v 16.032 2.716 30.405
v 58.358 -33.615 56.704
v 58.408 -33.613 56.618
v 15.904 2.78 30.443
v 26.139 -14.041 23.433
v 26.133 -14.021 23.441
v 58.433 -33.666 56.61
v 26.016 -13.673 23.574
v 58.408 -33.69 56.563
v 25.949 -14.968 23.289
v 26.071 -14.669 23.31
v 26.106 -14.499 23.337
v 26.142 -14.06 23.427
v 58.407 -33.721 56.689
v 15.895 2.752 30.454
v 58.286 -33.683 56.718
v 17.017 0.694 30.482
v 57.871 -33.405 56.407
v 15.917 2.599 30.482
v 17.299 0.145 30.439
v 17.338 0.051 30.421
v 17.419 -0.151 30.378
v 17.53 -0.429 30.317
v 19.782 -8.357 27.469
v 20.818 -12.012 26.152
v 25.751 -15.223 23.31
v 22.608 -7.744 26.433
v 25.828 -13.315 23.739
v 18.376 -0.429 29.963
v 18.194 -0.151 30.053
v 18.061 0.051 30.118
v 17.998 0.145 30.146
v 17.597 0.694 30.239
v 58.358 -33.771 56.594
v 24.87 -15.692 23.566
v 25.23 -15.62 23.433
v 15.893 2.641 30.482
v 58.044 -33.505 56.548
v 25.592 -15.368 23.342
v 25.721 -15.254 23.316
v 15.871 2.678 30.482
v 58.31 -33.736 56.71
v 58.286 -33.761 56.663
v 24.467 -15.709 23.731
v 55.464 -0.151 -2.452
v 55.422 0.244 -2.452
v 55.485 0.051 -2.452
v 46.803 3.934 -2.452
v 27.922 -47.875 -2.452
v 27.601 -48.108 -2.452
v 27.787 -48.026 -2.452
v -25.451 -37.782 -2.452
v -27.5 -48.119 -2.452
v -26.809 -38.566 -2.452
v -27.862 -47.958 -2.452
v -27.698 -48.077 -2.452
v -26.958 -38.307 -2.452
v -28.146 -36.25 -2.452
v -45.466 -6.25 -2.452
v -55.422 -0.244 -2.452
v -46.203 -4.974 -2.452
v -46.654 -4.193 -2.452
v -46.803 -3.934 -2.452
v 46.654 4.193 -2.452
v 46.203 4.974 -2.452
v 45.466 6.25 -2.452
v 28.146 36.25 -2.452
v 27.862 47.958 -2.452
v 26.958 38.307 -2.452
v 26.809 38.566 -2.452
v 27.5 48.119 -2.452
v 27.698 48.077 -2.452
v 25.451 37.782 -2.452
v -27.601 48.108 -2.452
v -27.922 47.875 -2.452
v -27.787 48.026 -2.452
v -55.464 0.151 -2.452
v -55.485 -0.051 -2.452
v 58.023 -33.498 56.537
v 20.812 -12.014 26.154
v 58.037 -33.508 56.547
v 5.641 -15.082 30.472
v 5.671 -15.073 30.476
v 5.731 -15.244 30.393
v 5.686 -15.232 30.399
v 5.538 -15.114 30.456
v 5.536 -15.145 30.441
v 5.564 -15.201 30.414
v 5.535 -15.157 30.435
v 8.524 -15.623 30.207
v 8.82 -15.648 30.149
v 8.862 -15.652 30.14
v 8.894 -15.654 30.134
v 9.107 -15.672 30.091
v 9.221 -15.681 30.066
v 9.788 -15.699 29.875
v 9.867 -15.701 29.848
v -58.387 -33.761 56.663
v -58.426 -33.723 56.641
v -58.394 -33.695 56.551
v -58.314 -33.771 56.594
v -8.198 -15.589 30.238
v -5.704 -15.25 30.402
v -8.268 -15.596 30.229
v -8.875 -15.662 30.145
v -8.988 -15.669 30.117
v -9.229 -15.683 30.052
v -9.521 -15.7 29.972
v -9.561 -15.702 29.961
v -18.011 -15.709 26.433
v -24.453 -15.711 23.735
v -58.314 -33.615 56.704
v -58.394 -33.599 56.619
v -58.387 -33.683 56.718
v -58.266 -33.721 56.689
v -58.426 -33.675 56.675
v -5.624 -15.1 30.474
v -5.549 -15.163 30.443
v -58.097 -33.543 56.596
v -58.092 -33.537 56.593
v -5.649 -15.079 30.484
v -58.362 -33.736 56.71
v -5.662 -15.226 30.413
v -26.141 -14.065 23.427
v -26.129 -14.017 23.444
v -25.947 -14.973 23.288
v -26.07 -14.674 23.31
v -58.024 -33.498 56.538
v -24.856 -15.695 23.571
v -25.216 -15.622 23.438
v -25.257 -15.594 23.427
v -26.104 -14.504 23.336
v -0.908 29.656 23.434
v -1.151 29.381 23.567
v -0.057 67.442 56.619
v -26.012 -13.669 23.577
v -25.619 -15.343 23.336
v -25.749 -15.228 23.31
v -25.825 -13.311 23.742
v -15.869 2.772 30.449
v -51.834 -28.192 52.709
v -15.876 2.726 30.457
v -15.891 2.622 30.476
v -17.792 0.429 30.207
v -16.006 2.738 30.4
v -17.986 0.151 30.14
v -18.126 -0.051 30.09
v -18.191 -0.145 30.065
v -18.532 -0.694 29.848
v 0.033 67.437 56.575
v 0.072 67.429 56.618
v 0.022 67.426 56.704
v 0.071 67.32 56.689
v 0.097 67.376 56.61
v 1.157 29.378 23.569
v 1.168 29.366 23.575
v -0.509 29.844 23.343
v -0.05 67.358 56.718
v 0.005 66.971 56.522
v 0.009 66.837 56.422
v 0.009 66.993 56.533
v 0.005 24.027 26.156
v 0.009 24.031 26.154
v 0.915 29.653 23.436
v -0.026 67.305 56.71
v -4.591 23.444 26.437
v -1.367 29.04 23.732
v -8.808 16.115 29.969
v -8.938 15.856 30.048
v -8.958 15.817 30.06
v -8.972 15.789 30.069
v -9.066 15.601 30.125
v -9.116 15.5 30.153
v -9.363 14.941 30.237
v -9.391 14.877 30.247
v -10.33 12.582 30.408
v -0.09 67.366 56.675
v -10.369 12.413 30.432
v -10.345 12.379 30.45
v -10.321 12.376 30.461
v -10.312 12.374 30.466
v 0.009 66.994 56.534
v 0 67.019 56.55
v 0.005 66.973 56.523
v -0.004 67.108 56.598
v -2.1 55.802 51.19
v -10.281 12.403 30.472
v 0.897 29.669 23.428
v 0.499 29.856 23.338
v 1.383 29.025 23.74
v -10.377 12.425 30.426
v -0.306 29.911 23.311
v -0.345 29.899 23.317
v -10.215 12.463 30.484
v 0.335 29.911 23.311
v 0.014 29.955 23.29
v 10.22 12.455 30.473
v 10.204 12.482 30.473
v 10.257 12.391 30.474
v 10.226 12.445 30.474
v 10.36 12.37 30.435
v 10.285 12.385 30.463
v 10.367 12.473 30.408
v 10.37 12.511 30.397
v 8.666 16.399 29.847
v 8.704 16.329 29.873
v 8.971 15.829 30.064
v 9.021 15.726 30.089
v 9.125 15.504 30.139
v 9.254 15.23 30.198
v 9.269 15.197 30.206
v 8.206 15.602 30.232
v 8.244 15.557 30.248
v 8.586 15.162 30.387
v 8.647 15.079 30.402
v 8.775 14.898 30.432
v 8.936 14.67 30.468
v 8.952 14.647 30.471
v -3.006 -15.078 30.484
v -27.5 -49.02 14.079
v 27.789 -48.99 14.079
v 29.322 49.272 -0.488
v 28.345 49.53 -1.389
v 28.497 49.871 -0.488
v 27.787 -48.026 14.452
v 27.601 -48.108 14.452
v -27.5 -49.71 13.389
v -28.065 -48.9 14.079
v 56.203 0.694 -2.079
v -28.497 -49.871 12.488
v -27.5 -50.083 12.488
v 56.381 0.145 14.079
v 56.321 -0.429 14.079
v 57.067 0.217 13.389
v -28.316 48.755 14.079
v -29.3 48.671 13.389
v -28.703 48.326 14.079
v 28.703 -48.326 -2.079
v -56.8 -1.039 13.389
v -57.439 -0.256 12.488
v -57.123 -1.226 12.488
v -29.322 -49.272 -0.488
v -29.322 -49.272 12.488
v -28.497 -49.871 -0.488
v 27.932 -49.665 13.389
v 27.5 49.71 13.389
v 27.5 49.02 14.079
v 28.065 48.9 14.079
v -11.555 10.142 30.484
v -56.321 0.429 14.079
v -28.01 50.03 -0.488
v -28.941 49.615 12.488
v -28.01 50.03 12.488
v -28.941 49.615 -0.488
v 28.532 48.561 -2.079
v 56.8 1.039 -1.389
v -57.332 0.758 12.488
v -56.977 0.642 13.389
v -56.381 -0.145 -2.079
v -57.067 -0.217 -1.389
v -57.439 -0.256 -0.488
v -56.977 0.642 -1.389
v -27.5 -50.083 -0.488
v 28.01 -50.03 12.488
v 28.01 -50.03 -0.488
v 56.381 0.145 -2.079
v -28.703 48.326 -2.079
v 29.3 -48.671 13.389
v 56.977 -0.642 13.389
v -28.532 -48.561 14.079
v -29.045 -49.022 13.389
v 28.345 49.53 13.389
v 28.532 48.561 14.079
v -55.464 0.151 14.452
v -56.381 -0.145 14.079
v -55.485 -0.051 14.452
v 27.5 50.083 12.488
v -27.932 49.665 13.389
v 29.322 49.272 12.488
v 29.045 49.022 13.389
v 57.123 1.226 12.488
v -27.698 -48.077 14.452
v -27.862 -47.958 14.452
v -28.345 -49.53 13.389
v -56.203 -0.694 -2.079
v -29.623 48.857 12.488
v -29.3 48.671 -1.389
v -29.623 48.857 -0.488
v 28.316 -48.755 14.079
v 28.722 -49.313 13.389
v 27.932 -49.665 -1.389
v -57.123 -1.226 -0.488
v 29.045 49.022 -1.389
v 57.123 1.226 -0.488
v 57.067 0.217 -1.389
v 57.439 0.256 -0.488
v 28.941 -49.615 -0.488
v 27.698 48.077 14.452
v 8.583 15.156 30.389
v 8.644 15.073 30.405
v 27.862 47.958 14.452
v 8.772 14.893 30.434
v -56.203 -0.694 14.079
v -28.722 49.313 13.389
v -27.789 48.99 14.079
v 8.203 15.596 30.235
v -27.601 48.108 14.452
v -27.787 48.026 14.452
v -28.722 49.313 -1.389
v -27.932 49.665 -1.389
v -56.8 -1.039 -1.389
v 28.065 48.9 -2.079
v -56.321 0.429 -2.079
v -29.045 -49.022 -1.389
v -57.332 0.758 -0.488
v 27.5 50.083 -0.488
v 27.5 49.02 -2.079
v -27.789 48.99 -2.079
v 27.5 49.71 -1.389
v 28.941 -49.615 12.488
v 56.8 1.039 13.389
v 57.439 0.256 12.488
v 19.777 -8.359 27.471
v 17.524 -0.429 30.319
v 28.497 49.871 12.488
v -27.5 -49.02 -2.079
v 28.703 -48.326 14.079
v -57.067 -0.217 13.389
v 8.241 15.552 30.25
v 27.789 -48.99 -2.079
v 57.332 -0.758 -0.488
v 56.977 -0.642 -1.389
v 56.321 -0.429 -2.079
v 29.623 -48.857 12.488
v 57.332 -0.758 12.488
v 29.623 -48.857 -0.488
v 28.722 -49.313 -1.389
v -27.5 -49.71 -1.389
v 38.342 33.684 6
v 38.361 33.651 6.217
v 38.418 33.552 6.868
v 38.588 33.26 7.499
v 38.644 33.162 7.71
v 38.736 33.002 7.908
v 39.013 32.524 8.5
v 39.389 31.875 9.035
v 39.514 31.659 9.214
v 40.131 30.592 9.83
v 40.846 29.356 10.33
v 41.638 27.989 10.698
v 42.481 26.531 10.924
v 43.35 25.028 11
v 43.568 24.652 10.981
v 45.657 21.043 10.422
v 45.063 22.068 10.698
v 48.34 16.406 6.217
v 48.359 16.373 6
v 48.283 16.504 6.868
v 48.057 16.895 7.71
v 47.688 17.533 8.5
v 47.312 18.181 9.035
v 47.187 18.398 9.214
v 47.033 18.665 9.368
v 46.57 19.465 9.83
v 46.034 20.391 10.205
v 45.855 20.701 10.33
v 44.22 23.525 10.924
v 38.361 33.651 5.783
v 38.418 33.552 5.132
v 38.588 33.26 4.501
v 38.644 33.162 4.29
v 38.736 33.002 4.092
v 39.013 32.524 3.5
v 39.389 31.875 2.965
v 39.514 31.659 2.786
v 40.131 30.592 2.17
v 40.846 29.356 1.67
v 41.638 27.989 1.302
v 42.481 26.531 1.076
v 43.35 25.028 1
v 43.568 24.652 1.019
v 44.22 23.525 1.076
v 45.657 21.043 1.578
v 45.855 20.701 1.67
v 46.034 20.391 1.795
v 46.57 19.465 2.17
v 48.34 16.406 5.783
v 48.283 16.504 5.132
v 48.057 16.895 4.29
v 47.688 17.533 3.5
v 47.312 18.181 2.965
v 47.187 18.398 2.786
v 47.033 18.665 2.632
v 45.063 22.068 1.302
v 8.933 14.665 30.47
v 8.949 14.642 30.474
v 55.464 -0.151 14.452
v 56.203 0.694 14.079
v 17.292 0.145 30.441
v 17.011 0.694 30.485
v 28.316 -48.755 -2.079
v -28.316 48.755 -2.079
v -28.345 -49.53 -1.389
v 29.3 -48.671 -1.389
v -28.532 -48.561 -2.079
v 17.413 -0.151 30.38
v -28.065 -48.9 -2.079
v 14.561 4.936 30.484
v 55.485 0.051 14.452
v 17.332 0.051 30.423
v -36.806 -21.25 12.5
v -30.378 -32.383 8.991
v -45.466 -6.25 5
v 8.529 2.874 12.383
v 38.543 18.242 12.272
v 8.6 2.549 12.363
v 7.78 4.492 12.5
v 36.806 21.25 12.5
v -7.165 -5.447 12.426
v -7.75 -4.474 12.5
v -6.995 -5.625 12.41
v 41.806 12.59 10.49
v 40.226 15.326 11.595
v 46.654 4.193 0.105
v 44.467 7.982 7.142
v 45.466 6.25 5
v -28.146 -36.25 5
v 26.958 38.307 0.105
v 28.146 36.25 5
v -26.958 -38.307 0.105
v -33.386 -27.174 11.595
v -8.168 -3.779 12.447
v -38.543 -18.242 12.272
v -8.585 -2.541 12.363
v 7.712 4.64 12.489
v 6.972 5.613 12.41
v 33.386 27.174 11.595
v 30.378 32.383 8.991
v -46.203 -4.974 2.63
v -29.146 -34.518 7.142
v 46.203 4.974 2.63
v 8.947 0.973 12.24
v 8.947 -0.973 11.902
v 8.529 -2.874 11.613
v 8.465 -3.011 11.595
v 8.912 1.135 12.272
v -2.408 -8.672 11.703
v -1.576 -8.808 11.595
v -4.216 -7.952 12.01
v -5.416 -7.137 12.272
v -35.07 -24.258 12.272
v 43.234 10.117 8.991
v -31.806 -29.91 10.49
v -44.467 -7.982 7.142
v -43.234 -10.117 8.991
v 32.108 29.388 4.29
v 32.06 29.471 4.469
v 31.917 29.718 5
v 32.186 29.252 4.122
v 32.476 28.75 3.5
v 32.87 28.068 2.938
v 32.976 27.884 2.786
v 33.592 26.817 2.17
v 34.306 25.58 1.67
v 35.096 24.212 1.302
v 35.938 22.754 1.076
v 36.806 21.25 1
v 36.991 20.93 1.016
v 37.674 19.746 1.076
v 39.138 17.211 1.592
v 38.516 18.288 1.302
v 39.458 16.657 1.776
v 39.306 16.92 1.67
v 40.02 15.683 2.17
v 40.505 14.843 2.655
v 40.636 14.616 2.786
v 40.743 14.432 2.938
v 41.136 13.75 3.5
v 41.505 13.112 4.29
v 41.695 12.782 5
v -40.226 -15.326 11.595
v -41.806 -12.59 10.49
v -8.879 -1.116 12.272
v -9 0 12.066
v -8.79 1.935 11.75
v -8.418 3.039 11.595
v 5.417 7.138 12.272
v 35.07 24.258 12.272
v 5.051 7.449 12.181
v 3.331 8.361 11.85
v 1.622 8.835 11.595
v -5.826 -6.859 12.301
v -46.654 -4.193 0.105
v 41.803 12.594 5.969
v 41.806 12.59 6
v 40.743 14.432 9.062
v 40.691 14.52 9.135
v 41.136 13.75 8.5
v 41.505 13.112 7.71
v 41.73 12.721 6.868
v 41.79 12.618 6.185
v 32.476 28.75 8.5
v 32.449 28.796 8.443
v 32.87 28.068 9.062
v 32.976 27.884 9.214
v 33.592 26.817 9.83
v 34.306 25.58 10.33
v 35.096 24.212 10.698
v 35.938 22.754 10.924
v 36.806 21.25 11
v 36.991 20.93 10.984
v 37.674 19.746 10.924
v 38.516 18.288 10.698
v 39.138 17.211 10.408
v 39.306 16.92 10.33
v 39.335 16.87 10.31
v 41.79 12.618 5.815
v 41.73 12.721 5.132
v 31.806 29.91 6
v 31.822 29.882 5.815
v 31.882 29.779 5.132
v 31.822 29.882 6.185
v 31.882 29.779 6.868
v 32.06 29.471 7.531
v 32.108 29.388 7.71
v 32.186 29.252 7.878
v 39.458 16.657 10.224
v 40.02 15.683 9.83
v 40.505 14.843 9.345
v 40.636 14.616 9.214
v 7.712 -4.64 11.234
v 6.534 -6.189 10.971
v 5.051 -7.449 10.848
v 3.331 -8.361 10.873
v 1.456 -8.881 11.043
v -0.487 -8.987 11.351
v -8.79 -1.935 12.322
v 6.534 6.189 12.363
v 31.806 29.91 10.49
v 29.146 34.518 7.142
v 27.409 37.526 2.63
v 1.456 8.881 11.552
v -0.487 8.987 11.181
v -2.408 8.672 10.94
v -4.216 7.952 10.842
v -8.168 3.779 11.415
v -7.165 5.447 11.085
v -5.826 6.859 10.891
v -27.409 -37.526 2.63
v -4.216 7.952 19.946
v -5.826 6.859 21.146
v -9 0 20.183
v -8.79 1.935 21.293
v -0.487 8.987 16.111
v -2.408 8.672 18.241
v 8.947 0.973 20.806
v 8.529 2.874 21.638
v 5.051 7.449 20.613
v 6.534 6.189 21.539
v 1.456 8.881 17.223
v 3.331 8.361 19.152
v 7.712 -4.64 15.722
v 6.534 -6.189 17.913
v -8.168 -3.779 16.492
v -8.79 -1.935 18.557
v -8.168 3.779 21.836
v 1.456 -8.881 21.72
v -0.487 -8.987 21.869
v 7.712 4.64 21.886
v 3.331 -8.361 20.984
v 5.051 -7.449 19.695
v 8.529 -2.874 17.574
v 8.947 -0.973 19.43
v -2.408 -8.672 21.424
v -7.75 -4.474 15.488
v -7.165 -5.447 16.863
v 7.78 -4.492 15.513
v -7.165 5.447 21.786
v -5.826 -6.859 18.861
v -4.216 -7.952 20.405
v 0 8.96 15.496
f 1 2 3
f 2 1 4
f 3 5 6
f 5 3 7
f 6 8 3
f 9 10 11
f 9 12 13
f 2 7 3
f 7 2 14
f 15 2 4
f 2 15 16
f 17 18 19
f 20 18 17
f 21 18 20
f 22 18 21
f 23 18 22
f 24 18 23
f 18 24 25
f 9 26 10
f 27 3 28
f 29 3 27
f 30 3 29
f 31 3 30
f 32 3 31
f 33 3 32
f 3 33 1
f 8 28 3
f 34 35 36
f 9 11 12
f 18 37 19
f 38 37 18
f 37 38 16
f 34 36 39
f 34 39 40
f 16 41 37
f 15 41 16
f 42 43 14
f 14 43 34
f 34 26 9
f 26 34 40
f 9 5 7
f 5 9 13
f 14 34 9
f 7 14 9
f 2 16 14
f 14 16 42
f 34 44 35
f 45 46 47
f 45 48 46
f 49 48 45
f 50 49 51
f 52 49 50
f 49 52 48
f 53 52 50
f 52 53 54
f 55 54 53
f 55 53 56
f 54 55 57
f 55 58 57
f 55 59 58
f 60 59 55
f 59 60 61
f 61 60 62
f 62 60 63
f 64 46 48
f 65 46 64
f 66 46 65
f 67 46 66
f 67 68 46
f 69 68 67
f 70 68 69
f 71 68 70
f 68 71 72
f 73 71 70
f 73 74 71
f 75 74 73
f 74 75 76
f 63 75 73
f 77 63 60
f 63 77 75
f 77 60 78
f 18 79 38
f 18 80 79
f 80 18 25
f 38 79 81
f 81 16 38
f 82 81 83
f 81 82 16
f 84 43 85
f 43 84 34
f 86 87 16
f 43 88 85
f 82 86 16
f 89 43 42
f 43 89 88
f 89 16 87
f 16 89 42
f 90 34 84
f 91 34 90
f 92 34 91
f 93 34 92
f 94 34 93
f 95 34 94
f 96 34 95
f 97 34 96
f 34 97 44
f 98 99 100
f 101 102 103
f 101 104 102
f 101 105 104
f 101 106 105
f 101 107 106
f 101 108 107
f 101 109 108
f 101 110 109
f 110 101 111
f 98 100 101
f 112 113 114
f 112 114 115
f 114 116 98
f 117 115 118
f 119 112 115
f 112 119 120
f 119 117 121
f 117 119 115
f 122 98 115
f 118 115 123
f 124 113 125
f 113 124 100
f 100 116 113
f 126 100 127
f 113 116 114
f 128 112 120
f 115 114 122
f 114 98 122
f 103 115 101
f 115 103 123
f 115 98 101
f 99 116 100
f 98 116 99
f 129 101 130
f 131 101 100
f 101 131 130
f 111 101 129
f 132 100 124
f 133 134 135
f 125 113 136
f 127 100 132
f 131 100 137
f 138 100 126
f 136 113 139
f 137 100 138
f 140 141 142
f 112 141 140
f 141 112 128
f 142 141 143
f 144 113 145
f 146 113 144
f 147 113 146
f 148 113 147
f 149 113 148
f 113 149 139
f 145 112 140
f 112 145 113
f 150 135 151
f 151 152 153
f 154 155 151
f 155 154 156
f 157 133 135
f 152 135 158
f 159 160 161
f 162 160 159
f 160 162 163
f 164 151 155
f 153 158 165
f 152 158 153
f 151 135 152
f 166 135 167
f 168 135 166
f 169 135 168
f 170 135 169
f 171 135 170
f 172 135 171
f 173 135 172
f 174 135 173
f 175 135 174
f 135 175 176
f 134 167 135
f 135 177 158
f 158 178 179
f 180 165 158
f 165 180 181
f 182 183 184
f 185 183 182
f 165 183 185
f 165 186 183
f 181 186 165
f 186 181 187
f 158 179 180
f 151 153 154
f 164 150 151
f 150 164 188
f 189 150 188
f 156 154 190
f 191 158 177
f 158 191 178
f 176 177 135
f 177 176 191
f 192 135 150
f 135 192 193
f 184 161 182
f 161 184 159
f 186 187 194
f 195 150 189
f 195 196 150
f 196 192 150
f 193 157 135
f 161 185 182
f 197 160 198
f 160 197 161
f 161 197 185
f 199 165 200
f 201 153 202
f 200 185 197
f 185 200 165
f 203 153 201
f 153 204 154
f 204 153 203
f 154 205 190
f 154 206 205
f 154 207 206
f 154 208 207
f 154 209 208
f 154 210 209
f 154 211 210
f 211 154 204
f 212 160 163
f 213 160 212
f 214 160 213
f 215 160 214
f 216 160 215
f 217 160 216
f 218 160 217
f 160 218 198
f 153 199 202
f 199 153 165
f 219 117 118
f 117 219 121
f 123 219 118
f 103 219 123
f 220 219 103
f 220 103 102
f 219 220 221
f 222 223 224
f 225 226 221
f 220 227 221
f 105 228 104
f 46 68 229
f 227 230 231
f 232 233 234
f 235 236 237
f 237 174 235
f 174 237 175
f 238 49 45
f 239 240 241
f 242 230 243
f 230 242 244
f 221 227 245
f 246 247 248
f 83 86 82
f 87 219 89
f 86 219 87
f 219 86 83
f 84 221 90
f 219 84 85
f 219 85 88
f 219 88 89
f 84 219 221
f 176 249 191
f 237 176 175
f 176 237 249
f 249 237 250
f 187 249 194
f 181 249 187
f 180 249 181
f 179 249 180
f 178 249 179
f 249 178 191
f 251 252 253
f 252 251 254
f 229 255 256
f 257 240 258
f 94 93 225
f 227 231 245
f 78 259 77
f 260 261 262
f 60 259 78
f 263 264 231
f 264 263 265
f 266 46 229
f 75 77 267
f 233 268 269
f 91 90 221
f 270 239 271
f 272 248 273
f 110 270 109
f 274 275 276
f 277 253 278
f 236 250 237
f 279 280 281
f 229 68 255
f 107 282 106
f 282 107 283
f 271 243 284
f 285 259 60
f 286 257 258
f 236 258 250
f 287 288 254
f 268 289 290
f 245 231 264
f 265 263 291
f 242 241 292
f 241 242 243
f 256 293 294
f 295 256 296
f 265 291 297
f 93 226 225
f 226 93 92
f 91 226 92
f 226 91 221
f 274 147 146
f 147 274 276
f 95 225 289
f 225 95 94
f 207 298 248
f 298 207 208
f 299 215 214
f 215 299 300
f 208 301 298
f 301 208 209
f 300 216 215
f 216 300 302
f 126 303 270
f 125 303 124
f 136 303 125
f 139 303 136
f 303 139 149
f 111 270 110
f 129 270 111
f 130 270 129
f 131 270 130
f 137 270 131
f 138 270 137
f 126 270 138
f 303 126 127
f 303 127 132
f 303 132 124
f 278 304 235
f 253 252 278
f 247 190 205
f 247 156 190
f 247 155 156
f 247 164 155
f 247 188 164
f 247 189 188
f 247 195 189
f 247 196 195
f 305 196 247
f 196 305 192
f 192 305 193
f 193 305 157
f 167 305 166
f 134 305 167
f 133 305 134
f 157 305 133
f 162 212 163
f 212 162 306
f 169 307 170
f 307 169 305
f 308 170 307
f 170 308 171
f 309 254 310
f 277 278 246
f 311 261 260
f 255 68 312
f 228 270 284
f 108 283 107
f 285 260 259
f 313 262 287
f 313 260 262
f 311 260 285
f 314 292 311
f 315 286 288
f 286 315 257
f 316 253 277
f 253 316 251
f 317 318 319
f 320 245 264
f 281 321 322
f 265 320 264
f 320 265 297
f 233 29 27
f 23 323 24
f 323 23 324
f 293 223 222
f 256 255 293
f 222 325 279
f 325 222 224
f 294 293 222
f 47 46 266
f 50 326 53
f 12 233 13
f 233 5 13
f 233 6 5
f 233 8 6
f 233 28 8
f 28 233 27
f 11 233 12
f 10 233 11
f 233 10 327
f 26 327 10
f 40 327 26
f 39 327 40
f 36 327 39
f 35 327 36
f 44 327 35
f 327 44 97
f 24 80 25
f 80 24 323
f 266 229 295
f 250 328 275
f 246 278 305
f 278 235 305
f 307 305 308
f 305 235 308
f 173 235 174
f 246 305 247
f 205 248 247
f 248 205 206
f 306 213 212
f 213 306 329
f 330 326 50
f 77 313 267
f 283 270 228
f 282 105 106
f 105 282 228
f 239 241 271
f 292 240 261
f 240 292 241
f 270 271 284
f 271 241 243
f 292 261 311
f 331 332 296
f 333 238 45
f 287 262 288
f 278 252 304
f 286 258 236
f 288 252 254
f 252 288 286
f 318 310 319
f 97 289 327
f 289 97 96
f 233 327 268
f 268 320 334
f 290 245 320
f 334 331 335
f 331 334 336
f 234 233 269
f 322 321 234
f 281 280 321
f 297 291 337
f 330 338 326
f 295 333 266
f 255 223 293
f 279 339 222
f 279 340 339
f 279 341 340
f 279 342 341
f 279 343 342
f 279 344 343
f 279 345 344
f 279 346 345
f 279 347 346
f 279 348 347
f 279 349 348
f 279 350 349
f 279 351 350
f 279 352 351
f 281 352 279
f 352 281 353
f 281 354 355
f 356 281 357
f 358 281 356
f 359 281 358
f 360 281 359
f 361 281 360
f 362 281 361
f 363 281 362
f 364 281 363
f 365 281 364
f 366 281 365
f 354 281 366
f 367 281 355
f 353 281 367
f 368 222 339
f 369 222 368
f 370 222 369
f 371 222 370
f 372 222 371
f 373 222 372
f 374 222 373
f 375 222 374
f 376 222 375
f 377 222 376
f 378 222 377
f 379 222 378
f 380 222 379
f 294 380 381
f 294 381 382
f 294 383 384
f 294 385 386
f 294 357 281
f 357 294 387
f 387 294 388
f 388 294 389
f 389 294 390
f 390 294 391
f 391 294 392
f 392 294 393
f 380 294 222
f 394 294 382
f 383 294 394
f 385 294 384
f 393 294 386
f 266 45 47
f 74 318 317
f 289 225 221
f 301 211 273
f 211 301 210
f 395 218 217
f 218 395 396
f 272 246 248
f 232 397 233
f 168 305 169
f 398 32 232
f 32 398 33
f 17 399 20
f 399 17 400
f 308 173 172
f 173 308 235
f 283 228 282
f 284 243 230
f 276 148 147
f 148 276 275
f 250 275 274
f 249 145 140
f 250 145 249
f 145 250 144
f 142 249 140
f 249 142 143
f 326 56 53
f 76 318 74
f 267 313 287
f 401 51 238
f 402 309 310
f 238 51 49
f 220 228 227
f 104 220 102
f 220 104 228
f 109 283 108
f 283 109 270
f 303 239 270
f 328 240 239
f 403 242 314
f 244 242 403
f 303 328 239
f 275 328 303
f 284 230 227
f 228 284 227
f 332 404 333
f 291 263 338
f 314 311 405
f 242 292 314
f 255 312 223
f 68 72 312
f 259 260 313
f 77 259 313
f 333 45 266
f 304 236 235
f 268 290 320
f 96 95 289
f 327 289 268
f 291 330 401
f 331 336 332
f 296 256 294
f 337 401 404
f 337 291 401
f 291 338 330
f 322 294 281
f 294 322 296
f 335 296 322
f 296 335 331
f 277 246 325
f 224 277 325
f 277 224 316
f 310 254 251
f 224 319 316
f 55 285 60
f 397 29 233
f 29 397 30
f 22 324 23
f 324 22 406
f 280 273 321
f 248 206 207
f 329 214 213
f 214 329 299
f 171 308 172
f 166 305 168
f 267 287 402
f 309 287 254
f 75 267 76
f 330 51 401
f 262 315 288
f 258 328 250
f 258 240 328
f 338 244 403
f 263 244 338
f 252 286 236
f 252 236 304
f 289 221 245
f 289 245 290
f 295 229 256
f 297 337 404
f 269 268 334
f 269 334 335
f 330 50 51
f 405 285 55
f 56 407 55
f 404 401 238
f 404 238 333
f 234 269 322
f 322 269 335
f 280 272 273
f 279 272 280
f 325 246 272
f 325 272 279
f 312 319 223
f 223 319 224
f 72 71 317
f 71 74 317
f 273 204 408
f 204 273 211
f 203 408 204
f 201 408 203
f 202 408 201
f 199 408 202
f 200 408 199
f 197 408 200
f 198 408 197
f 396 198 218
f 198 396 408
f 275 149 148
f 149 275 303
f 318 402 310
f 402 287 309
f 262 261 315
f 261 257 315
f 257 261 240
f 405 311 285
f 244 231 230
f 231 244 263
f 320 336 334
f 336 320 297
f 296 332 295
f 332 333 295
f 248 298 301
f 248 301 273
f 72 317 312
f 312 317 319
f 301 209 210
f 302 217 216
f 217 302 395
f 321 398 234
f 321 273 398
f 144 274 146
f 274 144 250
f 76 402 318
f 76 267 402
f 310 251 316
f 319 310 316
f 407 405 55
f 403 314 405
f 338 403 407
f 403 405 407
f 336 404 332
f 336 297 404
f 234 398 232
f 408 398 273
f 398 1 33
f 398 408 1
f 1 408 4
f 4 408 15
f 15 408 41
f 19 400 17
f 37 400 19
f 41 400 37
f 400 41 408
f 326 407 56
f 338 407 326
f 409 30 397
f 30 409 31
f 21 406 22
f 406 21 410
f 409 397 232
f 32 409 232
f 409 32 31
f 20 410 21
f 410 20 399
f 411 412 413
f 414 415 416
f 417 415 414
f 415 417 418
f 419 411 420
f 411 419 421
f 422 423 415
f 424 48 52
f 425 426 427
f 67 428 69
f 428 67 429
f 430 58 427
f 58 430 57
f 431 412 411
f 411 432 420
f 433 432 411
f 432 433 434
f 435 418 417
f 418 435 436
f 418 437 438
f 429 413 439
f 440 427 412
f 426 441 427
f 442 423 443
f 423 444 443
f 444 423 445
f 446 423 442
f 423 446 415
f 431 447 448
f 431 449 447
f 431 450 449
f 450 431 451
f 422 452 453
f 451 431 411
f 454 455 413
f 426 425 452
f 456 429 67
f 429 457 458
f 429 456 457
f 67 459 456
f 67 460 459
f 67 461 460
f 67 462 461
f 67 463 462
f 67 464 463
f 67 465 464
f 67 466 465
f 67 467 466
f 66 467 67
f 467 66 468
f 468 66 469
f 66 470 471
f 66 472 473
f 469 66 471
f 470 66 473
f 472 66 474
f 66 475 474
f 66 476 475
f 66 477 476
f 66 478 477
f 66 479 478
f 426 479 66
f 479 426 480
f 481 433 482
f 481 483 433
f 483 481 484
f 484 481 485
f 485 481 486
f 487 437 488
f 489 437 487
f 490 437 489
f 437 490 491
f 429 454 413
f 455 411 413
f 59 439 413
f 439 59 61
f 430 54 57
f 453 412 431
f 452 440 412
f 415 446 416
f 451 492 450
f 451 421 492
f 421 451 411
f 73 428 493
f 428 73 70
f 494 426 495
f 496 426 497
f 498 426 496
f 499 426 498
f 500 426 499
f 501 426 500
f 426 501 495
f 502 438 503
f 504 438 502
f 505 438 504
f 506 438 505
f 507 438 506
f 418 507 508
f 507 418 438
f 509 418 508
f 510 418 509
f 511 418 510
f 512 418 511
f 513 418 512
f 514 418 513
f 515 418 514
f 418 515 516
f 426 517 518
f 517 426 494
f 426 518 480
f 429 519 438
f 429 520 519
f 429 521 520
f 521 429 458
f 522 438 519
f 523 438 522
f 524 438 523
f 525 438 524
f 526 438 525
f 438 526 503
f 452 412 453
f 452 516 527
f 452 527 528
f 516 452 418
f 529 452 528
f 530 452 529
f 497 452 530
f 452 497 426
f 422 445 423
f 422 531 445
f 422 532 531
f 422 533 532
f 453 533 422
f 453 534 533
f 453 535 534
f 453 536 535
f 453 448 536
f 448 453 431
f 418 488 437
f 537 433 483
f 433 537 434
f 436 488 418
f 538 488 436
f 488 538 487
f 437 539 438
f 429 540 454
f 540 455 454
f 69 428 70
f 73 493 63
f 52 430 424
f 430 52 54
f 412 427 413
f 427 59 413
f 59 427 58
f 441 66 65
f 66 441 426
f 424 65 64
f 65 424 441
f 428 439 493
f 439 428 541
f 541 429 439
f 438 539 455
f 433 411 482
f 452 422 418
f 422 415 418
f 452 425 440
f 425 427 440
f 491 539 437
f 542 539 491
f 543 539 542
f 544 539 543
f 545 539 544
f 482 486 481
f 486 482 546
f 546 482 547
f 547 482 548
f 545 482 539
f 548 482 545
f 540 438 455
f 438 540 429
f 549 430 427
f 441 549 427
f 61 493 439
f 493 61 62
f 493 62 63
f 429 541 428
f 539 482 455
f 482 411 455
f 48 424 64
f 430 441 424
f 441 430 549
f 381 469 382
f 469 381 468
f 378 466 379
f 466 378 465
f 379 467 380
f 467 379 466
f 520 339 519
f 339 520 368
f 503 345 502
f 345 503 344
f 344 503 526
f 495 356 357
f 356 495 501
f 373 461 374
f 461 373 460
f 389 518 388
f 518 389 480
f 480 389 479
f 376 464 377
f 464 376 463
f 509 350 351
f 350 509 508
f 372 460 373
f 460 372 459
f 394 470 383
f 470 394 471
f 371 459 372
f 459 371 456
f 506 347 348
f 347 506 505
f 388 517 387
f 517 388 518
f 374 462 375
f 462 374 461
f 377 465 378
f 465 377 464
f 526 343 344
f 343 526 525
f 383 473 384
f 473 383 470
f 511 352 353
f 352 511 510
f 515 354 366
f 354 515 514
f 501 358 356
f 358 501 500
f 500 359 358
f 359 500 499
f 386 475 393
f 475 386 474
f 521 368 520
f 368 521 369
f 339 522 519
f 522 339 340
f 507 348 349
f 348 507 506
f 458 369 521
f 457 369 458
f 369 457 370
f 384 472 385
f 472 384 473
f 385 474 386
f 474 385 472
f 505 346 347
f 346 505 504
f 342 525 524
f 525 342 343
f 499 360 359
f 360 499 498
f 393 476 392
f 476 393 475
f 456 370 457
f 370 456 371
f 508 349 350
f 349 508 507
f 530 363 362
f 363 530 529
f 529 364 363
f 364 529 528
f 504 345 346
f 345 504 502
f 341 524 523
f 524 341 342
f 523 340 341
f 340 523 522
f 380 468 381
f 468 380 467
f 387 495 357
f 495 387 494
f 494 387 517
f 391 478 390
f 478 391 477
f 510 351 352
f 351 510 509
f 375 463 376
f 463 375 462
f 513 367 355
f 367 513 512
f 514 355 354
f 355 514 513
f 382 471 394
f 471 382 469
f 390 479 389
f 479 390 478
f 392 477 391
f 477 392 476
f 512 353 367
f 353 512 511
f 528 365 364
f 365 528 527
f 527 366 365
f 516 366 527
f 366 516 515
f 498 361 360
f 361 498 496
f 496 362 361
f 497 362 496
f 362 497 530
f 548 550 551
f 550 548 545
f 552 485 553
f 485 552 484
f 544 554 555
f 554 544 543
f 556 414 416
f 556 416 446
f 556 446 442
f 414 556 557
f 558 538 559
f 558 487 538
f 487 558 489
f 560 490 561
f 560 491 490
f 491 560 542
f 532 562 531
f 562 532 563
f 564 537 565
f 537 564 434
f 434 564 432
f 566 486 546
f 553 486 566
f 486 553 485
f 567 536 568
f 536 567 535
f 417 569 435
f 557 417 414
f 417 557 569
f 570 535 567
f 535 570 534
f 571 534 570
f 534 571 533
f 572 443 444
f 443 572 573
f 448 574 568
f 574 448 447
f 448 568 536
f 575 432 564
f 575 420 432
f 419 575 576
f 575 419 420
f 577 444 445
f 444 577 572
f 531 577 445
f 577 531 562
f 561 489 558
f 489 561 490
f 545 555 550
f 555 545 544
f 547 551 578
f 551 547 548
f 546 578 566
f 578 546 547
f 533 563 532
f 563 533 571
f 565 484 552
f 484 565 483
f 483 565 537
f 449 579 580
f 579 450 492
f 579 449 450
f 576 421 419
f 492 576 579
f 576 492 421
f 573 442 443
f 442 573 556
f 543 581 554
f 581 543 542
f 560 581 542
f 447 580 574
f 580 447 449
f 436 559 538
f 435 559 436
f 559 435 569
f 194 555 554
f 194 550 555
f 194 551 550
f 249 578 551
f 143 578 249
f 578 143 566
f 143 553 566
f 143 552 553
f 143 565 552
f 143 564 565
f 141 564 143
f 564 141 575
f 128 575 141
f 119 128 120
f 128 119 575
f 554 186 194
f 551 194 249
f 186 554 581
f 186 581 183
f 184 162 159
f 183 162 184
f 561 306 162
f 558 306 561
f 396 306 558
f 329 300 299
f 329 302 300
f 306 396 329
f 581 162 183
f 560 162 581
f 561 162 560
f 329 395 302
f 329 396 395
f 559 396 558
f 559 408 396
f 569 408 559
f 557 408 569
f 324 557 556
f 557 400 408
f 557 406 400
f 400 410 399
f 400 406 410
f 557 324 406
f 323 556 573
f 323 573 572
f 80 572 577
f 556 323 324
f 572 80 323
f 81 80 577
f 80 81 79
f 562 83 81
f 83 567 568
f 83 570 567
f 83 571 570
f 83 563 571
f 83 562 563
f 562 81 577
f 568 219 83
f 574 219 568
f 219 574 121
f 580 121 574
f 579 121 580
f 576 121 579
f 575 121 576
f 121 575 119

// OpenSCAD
cubeHeigth = 20;
socketRadius=55;

socketCube();

module cubeCorner() {
    cornerHull(socketRadius*1.5, 0,                cubeHeigth,       0);
    cornerHull(socketRadius*1.5, 0,                0,                cubeHeigth);
    cornerHull(cubeHeigth,       0,                0,                socketRadius*1.5);
    cornerHull(0,                cubeHeigth,       0,                socketRadius*1.5);
    cornerHull(0,                socketRadius*1.5, 0,                cubeHeigth);
    cornerHull(cubeHeigth,       0,                socketRadius*1.5, 0);
}

module cornerHull(a, b, e, f) {
    hull() {
        translate([0,0,1*12-3]) rotate([45,-atan(sqrt(0.5)),0]) {
            translate([0,0,0]) sphere(0.1);
            translate([a,b,0]) sphere(0.1);
            translate([0,e,f]) sphere(0.1);
        }
        rotate([0,0,0]) translate([0,0,0*12]) sphere(d=5,$fn=15);
    }
}

module socketCube() { 
    difference() {
        union() {
            rotate([0,0,-30]) cubeCorner();
            hull() {
                for (i=[0:6]) {
                    rotate([0,0,i*60+30]) translate([0,socketRadius,0]) sphere(d=5,$fn=15);
                    rotate([0,0,i*60+30]) translate([0,socketRadius,12]) sphere(d=5,$fn=15);
                    rotate([0,0,i*60+30]) translate([0,12,2.5*12]) sphere(d=5,$fn=15);
                }
            }   
        }
        translate([0,0,-2.5]) rotate([0,90,30]) resize([30,40,85]) cylinder(d=40, h=120, center=true, $fn=36);

       rotate([0,90,30]) translate([-6,0,100]) resize([10,20,200]) cylinder(d=10,h=200,$fn=36,center=true);


        translate([0,0,9*12-3]) rotate([0,180,0]) cylinder(d=18,h=10*12);
        translate([0,0,1*12-2.84]) rotate([45,-atan(sqrt(0.5)),-30]) cube([socketRadius*1.5,socketRadius*1.5,socketRadius*1.5]);
    }
}
